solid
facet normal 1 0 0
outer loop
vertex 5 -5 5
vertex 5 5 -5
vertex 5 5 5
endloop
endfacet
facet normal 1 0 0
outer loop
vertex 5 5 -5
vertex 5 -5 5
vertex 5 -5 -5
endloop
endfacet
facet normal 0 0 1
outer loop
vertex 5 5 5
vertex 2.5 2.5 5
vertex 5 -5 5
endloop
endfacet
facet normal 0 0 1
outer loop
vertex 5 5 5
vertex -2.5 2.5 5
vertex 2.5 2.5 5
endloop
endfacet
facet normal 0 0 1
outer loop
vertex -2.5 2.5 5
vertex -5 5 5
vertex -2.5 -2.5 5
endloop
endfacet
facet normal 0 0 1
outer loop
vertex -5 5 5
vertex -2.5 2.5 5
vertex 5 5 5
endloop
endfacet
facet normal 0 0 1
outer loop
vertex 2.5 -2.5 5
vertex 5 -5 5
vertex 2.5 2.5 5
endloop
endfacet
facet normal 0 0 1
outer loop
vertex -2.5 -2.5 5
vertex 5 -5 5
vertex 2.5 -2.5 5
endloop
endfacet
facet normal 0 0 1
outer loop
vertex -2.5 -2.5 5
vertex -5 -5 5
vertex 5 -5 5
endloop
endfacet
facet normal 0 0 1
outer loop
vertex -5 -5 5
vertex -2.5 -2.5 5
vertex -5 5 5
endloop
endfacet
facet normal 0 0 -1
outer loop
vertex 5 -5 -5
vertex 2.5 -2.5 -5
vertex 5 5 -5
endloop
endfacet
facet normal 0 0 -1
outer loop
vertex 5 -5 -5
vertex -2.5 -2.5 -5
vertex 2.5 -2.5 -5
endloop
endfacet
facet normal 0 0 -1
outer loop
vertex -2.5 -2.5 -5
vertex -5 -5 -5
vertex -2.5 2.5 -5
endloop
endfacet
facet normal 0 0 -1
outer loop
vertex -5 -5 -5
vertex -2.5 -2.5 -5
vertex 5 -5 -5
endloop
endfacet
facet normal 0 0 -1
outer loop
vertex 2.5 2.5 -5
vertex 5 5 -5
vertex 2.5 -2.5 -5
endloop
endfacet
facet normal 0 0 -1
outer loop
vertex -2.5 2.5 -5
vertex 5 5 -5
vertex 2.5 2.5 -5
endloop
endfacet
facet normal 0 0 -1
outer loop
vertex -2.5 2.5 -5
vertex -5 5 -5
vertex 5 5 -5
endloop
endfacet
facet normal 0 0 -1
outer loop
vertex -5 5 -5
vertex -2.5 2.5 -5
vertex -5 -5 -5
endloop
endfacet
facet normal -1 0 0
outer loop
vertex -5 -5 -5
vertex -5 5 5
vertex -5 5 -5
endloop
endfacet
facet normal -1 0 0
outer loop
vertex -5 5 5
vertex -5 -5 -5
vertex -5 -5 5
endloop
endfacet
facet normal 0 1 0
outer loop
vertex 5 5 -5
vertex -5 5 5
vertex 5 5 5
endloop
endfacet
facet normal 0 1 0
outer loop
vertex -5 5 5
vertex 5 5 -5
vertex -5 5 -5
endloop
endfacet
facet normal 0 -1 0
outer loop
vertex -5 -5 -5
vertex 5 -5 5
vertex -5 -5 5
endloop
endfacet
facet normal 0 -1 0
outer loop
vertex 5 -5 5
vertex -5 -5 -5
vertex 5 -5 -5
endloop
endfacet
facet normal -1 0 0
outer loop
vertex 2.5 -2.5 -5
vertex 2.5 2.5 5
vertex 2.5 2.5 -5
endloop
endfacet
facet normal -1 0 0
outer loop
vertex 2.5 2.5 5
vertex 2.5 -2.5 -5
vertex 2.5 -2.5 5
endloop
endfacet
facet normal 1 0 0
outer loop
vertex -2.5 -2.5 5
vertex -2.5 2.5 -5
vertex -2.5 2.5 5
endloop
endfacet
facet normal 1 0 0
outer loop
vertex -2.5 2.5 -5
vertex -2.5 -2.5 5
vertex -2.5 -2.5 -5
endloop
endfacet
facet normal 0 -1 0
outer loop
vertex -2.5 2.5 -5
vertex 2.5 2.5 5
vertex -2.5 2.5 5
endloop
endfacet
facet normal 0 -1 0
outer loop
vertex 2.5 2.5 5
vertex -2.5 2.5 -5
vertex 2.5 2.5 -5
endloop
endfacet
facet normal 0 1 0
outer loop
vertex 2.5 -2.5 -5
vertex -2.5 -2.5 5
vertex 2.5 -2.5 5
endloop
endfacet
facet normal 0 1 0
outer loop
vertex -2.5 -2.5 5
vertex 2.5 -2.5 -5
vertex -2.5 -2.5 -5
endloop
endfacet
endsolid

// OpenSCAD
$fn=10;

difference() {
    cube([10,10,10], center=true);
    cube([5,5,10], center=true);
}
